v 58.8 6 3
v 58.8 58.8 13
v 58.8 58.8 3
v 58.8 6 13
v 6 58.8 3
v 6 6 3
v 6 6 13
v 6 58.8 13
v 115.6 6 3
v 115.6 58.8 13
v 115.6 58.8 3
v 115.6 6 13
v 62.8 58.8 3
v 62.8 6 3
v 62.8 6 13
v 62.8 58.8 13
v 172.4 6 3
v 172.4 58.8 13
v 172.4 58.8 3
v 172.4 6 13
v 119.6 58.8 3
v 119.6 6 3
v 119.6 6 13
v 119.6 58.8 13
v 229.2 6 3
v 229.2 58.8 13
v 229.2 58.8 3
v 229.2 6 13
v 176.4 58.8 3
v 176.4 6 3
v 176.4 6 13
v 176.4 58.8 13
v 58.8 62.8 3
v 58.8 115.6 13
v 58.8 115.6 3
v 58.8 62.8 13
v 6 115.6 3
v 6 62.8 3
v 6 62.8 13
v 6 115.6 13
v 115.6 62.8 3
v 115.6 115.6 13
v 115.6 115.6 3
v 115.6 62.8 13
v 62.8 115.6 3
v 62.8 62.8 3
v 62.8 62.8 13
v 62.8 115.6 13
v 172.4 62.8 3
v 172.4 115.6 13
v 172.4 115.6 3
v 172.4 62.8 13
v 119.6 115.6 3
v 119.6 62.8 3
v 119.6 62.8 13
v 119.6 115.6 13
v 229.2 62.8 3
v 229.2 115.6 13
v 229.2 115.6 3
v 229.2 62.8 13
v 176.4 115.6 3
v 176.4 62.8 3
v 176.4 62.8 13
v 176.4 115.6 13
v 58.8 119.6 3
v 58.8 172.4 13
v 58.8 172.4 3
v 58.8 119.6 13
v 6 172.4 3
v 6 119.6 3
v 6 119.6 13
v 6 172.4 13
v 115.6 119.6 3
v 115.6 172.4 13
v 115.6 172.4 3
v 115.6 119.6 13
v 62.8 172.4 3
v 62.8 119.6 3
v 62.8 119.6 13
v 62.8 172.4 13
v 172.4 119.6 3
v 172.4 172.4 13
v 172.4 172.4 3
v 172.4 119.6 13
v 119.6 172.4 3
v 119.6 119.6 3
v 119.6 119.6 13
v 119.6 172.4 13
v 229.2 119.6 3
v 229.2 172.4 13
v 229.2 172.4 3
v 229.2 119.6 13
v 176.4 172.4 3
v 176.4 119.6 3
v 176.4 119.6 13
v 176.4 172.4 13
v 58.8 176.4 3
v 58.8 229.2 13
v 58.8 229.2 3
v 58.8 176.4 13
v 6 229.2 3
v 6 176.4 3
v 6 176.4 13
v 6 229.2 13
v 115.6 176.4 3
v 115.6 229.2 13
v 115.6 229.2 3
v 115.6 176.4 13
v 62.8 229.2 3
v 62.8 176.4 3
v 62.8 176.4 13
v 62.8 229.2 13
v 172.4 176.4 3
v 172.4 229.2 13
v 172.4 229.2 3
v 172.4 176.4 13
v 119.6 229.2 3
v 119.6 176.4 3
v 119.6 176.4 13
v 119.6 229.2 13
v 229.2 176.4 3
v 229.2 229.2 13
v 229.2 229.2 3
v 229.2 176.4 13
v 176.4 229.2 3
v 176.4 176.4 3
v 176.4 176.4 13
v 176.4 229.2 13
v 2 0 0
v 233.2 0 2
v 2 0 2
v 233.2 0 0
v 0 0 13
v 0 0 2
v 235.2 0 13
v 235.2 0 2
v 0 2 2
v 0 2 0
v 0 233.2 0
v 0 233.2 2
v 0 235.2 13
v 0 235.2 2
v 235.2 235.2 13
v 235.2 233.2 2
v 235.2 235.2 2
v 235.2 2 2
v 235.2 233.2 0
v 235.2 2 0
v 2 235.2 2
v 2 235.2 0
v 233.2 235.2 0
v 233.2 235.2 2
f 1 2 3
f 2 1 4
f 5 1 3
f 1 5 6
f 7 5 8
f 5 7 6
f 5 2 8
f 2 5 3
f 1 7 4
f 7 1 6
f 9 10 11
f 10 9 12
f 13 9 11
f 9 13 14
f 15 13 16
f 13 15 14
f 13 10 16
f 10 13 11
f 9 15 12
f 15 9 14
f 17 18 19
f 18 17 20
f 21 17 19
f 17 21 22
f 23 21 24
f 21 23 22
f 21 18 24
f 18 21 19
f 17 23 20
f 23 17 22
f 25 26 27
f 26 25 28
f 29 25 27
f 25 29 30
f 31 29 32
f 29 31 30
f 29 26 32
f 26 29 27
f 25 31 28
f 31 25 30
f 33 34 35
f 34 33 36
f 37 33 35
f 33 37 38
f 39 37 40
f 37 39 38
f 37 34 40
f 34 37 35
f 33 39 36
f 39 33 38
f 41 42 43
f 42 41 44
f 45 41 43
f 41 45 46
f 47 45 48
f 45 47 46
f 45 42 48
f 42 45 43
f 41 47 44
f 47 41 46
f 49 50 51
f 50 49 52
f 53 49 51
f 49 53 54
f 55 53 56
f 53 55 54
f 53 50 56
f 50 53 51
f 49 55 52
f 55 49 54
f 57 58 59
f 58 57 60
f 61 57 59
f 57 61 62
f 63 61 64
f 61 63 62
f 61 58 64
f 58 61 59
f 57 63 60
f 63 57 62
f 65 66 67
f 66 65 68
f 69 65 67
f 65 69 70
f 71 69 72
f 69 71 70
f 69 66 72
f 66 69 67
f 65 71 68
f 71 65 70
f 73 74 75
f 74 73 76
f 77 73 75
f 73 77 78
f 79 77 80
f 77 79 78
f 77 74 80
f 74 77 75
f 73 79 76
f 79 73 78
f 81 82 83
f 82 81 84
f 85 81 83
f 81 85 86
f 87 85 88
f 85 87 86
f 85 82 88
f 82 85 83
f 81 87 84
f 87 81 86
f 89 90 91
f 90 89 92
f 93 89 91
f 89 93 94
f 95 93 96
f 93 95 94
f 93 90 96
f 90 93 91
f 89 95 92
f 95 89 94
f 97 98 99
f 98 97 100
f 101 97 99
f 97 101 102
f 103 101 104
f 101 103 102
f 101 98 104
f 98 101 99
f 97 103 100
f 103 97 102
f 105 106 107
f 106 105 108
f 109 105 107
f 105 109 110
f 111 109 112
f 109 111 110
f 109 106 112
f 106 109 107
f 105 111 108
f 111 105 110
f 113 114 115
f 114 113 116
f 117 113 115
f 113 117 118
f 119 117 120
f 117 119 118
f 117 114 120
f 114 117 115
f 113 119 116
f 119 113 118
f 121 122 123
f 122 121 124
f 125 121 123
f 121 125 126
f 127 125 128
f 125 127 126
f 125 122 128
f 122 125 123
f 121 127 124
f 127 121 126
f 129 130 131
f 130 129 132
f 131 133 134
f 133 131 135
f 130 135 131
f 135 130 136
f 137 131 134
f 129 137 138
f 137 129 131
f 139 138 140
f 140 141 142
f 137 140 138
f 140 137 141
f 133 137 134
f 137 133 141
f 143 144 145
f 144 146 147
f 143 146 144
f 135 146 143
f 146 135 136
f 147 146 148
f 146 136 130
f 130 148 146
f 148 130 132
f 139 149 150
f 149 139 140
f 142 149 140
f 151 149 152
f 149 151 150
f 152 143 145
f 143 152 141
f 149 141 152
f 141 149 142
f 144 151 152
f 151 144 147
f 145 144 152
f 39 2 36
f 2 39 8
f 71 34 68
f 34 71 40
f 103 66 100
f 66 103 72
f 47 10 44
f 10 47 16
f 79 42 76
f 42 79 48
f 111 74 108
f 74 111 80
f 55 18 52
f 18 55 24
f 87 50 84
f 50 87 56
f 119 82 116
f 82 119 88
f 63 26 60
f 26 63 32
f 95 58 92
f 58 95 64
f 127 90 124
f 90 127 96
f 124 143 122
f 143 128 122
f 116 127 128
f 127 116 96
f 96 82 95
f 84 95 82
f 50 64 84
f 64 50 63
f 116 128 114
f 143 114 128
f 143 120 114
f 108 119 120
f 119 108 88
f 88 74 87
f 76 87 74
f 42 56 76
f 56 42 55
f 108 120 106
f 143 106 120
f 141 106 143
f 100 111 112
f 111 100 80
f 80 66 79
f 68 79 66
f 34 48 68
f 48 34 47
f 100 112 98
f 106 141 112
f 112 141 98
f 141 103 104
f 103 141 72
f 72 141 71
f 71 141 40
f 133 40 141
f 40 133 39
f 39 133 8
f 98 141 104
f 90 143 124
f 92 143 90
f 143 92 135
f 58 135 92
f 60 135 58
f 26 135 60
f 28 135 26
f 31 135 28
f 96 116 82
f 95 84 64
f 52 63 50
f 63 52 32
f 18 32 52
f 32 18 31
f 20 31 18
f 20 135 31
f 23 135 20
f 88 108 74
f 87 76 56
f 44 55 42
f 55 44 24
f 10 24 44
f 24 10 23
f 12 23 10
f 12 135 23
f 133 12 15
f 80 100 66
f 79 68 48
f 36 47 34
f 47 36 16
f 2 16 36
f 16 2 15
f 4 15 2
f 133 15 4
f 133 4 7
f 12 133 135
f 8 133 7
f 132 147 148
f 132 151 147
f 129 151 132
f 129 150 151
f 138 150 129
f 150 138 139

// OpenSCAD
// WheresDat — Grid tray for off-the-shelf clear hinged-lid bins
//
// NOT the Sortimo T-Boxx grid (see sortimo_tray.scad) — that pitch
// (52.3mm) is tied to a specific different product and would leave
// ~14mm of dead space around a bin this small on every side. This is a
// separate tray for a separate product: cheap unbranded clear plastic
// bins with their own hinged lid, bought instead of printing boxes.
//
// Bin spec — SATINIOR 48-pack, the "2 x 2 x 1.4 Inches" variant
// specifically (this listing sells 9 different sizes; don't assume a
// pasted spec is this one without checking the selected size swatch).
// Picked for small hardware (nuts, washers, etc.) over the smaller
// variants because it's the deepest of the bunch (35.6mm vs ~20mm for
// most others) — hardware needs more than one layer of depth to be
// worth a bin. Treated as the OUTER footprint, per usual listing
// convention. Cheap unbranded parts like this often run a little under
// nominal and the hinge may protrude slightly past the footprint when
// closed — print ONE pocket first and test-fit a real bin before
// committing to a full tray, same caveat as sortimo_tray.scad.
//
// Because each bin has its own lid, this tray doesn't need the outer
// perimeter rim height or the separate cap/box.scad system that
// sortimo_tray.scad relies on — it only needs to locate and cradle each
// bin's base. Pocket mechanism (individually-walled cell per `boxes`
// entry) is deliberately copied from sortimo_tray.scad's pattern.

/* [Printer] */
max_bed_x = 300; // mm
max_bed_y = 300; // mm

/* [Bin spec — from the listing, confirm against a physical bin before a full print] */
bin_x = 50.8; // mm, outer footprint (2 in)
bin_y = 50.8; // mm, outer footprint (2 in)
bin_z = 35.6; // mm, closed height (1.4 in) — informational, not used for pocket depth (shallow cubby, see below)

/* [Tray construction] */
pocket_depth         = 10;  // mm, recess depth — a cradle for the bin's base, not a full socket.
                             // Bumped from an earlier 8mm draft sized for a much smaller/lighter
                             // bin variant — nuts and washers are dense, a bit more lateral
                             // cradling helps keep a loaded bin from tipping in the pocket.
wall_thickness       = 3;   // mm, divider wall between adjacent bins — matches sortimo_tray's
                             // value; hardware content is heavier than the smaller bin variant
                             // this file started from, so kept at the same proven thickness
                             // rather than thinned down.
outer_wall_thickness = 4;   // mm, perimeter wall
// Deliberately short — unlike sortimo_tray.scad, there's no shared cap
// sitting on top of this rim (each bin closes itself), so this is just
// enough to protect the edge and leave room for a label, not a
// structural retention wall.
outer_wall_height    = 10;  // mm, total height of the raised perimeter rim, measured from the base
fit_clearance        = 0.5; // mm, per-side tolerance beyond the divider wall — looser than sortimo_tray's
                             // 0.3mm on purpose: this is an unbranded product with no engineering
                             // tolerance to trust, not a sourced spec like the T-Boxx grid.
tray_floor           = 3;   // mm, base plate thickness under the pockets — lighter than sortimo_tray's
                             // 5mm since this tray spans much less distance per bin (see spine note below).

/* [Rigidity spine — off by default] */
// sortimo_tray.scad added this for long unsupported spans on a
// multi-module tray. At this pitch a default 4x4 grid is only ~168mm
// across — short enough that it likely doesn't need it. Left available
// (same mechanism) in case the grid gets scaled up; just off by default.
spine_channel_enabled = false;
spine_channel_width   = 6;   // mm
spine_channel_depth   = 2;   // mm

/* [Base chamfer — relieves corner curling on the print bed] */
chamfer_size   = 2; // mm
chamfer_height = 2; // mm

/* [Grid pitch — derived from the bin size + clearance, not hand-picked] */
// inset (per side) = wall_thickness/2 + fit_clearance, mirroring
// sortimo_tray.scad's pocket formula exactly. module_size is chosen so
// the resulting pocket is bin size + 2mm total slop (1mm/side) — solve
// for it instead of picking a round number so the math traces back to
// the bin spec above.
inset       = wall_thickness / 2 + fit_clearance;
module_size = max(bin_x, bin_y) + 2 * 1.0 + 2 * inset; // 1.0mm/side slop + inset on each side

/* [Layout — [col, row, width_units, height_units], one entry per bin] */
// Starting grid: 4x4 = 16 bins, well under the bed limit, meant as a
// first test tray (per "I have exactly 1 good print" — validate fit
// before scaling up toward the full 48-pack across more trays).
// Every entry here is 1x1 — unlike sortimo_tray.scad's two wide
// channels, this is a genuine full grid, one walled pocket per bin.
grid_size_cols = 4;
grid_size_rows = 4;
boxes = [for (r = [0 : grid_size_rows - 1], c = [0 : grid_size_cols - 1]) [c, r, 1, 1]];

// ---------------------------------------------------------------------
// Derived geometry — shouldn't need editing below this line
// ---------------------------------------------------------------------

grid_cols = max([for (b = boxes) b[0] + b[2]]);
grid_rows = max([for (b = boxes) b[1] + b[3]]);

tray_x = grid_cols * module_size + outer_wall_thickness * 2;
tray_y = grid_rows * module_size + outer_wall_thickness * 2;
tray_z = tray_floor + pocket_depth;

assert(tray_x <= max_bed_x,
    str("Tray X (", tray_x, "mm) exceeds max_bed_x (", max_bed_x, "mm) — trim the grid or fix max_bed_x"));
assert(tray_y <= max_bed_y,
    str("Tray Y (", tray_y, "mm) exceeds max_bed_y (", max_bed_y, "mm) — trim the grid or fix max_bed_y"));
assert(!spine_channel_enabled || spine_channel_depth <= tray_floor - 1,
    str("spine_channel_depth (", spine_channel_depth, "mm) leaves less than 1mm of solid floor under a tray_floor of ", tray_floor, "mm — increase tray_floor or shrink spine_channel_depth"));
assert(module_size - 2 * inset > max(bin_x, bin_y),
    str("Computed pocket (", module_size - 2 * inset, "mm) isn't actually larger than the bin footprint (", max(bin_x, bin_y), "mm) — check bin_x/bin_y/wall_thickness/fit_clearance"));

module base_chamfer_cut(width, depth, size, height) {
    corners = [[0, 0], [width, 0], [0, depth], [width, depth]];
    for (c = corners) {
        dx = (c[0] == 0) ? 1 : -1;
        dy = (c[1] == 0) ? 1 : -1;
        translate([c[0], c[1], -0.5])
            linear_extrude(height = height + 0.5)
                polygon([[0, 0], [dx * size, 0], [0, dy * size]]);
    }
}

module outer_wall_riser() {
    if (outer_wall_height > tray_z) {
        translate([0, 0, tray_z])
            difference() {
                cube([tray_x, tray_y, outer_wall_height - tray_z]);
                translate([outer_wall_thickness, outer_wall_thickness, -0.5])
                    cube([
                        tray_x - 2 * outer_wall_thickness,
                        tray_y - 2 * outer_wall_thickness,
                        outer_wall_height - tray_z + 1
                    ]);
            }
    }
}

module bin_tray() {
    union() {
    difference() {
        cube([tray_x, tray_y, tray_z]);

        for (b = boxes) {
            pocket_inset = wall_thickness / 2 + fit_clearance;
            translate([
                outer_wall_thickness + b[0] * module_size + pocket_inset,
                outer_wall_thickness + b[1] * module_size + pocket_inset,
                tray_floor
            ])
            cube([
                b[2] * module_size - 2 * pocket_inset,
                b[3] * module_size - 2 * pocket_inset,
                pocket_depth + 1
            ]);
        }

        if (spine_channel_enabled) {
            for (r = [1 : grid_rows - 1]) {
                translate([
                    0,
                    outer_wall_thickness + r * module_size - spine_channel_width / 2,
                    -0.5
                ])
                cube([
                    tray_x,
                    spine_channel_width,
                    spine_channel_depth + 0.5
                ]);
            }
        }

        base_chamfer_cut(tray_x, tray_y, chamfer_size, chamfer_height);
    }
    outer_wall_riser();
    }
}

bin_tray();
